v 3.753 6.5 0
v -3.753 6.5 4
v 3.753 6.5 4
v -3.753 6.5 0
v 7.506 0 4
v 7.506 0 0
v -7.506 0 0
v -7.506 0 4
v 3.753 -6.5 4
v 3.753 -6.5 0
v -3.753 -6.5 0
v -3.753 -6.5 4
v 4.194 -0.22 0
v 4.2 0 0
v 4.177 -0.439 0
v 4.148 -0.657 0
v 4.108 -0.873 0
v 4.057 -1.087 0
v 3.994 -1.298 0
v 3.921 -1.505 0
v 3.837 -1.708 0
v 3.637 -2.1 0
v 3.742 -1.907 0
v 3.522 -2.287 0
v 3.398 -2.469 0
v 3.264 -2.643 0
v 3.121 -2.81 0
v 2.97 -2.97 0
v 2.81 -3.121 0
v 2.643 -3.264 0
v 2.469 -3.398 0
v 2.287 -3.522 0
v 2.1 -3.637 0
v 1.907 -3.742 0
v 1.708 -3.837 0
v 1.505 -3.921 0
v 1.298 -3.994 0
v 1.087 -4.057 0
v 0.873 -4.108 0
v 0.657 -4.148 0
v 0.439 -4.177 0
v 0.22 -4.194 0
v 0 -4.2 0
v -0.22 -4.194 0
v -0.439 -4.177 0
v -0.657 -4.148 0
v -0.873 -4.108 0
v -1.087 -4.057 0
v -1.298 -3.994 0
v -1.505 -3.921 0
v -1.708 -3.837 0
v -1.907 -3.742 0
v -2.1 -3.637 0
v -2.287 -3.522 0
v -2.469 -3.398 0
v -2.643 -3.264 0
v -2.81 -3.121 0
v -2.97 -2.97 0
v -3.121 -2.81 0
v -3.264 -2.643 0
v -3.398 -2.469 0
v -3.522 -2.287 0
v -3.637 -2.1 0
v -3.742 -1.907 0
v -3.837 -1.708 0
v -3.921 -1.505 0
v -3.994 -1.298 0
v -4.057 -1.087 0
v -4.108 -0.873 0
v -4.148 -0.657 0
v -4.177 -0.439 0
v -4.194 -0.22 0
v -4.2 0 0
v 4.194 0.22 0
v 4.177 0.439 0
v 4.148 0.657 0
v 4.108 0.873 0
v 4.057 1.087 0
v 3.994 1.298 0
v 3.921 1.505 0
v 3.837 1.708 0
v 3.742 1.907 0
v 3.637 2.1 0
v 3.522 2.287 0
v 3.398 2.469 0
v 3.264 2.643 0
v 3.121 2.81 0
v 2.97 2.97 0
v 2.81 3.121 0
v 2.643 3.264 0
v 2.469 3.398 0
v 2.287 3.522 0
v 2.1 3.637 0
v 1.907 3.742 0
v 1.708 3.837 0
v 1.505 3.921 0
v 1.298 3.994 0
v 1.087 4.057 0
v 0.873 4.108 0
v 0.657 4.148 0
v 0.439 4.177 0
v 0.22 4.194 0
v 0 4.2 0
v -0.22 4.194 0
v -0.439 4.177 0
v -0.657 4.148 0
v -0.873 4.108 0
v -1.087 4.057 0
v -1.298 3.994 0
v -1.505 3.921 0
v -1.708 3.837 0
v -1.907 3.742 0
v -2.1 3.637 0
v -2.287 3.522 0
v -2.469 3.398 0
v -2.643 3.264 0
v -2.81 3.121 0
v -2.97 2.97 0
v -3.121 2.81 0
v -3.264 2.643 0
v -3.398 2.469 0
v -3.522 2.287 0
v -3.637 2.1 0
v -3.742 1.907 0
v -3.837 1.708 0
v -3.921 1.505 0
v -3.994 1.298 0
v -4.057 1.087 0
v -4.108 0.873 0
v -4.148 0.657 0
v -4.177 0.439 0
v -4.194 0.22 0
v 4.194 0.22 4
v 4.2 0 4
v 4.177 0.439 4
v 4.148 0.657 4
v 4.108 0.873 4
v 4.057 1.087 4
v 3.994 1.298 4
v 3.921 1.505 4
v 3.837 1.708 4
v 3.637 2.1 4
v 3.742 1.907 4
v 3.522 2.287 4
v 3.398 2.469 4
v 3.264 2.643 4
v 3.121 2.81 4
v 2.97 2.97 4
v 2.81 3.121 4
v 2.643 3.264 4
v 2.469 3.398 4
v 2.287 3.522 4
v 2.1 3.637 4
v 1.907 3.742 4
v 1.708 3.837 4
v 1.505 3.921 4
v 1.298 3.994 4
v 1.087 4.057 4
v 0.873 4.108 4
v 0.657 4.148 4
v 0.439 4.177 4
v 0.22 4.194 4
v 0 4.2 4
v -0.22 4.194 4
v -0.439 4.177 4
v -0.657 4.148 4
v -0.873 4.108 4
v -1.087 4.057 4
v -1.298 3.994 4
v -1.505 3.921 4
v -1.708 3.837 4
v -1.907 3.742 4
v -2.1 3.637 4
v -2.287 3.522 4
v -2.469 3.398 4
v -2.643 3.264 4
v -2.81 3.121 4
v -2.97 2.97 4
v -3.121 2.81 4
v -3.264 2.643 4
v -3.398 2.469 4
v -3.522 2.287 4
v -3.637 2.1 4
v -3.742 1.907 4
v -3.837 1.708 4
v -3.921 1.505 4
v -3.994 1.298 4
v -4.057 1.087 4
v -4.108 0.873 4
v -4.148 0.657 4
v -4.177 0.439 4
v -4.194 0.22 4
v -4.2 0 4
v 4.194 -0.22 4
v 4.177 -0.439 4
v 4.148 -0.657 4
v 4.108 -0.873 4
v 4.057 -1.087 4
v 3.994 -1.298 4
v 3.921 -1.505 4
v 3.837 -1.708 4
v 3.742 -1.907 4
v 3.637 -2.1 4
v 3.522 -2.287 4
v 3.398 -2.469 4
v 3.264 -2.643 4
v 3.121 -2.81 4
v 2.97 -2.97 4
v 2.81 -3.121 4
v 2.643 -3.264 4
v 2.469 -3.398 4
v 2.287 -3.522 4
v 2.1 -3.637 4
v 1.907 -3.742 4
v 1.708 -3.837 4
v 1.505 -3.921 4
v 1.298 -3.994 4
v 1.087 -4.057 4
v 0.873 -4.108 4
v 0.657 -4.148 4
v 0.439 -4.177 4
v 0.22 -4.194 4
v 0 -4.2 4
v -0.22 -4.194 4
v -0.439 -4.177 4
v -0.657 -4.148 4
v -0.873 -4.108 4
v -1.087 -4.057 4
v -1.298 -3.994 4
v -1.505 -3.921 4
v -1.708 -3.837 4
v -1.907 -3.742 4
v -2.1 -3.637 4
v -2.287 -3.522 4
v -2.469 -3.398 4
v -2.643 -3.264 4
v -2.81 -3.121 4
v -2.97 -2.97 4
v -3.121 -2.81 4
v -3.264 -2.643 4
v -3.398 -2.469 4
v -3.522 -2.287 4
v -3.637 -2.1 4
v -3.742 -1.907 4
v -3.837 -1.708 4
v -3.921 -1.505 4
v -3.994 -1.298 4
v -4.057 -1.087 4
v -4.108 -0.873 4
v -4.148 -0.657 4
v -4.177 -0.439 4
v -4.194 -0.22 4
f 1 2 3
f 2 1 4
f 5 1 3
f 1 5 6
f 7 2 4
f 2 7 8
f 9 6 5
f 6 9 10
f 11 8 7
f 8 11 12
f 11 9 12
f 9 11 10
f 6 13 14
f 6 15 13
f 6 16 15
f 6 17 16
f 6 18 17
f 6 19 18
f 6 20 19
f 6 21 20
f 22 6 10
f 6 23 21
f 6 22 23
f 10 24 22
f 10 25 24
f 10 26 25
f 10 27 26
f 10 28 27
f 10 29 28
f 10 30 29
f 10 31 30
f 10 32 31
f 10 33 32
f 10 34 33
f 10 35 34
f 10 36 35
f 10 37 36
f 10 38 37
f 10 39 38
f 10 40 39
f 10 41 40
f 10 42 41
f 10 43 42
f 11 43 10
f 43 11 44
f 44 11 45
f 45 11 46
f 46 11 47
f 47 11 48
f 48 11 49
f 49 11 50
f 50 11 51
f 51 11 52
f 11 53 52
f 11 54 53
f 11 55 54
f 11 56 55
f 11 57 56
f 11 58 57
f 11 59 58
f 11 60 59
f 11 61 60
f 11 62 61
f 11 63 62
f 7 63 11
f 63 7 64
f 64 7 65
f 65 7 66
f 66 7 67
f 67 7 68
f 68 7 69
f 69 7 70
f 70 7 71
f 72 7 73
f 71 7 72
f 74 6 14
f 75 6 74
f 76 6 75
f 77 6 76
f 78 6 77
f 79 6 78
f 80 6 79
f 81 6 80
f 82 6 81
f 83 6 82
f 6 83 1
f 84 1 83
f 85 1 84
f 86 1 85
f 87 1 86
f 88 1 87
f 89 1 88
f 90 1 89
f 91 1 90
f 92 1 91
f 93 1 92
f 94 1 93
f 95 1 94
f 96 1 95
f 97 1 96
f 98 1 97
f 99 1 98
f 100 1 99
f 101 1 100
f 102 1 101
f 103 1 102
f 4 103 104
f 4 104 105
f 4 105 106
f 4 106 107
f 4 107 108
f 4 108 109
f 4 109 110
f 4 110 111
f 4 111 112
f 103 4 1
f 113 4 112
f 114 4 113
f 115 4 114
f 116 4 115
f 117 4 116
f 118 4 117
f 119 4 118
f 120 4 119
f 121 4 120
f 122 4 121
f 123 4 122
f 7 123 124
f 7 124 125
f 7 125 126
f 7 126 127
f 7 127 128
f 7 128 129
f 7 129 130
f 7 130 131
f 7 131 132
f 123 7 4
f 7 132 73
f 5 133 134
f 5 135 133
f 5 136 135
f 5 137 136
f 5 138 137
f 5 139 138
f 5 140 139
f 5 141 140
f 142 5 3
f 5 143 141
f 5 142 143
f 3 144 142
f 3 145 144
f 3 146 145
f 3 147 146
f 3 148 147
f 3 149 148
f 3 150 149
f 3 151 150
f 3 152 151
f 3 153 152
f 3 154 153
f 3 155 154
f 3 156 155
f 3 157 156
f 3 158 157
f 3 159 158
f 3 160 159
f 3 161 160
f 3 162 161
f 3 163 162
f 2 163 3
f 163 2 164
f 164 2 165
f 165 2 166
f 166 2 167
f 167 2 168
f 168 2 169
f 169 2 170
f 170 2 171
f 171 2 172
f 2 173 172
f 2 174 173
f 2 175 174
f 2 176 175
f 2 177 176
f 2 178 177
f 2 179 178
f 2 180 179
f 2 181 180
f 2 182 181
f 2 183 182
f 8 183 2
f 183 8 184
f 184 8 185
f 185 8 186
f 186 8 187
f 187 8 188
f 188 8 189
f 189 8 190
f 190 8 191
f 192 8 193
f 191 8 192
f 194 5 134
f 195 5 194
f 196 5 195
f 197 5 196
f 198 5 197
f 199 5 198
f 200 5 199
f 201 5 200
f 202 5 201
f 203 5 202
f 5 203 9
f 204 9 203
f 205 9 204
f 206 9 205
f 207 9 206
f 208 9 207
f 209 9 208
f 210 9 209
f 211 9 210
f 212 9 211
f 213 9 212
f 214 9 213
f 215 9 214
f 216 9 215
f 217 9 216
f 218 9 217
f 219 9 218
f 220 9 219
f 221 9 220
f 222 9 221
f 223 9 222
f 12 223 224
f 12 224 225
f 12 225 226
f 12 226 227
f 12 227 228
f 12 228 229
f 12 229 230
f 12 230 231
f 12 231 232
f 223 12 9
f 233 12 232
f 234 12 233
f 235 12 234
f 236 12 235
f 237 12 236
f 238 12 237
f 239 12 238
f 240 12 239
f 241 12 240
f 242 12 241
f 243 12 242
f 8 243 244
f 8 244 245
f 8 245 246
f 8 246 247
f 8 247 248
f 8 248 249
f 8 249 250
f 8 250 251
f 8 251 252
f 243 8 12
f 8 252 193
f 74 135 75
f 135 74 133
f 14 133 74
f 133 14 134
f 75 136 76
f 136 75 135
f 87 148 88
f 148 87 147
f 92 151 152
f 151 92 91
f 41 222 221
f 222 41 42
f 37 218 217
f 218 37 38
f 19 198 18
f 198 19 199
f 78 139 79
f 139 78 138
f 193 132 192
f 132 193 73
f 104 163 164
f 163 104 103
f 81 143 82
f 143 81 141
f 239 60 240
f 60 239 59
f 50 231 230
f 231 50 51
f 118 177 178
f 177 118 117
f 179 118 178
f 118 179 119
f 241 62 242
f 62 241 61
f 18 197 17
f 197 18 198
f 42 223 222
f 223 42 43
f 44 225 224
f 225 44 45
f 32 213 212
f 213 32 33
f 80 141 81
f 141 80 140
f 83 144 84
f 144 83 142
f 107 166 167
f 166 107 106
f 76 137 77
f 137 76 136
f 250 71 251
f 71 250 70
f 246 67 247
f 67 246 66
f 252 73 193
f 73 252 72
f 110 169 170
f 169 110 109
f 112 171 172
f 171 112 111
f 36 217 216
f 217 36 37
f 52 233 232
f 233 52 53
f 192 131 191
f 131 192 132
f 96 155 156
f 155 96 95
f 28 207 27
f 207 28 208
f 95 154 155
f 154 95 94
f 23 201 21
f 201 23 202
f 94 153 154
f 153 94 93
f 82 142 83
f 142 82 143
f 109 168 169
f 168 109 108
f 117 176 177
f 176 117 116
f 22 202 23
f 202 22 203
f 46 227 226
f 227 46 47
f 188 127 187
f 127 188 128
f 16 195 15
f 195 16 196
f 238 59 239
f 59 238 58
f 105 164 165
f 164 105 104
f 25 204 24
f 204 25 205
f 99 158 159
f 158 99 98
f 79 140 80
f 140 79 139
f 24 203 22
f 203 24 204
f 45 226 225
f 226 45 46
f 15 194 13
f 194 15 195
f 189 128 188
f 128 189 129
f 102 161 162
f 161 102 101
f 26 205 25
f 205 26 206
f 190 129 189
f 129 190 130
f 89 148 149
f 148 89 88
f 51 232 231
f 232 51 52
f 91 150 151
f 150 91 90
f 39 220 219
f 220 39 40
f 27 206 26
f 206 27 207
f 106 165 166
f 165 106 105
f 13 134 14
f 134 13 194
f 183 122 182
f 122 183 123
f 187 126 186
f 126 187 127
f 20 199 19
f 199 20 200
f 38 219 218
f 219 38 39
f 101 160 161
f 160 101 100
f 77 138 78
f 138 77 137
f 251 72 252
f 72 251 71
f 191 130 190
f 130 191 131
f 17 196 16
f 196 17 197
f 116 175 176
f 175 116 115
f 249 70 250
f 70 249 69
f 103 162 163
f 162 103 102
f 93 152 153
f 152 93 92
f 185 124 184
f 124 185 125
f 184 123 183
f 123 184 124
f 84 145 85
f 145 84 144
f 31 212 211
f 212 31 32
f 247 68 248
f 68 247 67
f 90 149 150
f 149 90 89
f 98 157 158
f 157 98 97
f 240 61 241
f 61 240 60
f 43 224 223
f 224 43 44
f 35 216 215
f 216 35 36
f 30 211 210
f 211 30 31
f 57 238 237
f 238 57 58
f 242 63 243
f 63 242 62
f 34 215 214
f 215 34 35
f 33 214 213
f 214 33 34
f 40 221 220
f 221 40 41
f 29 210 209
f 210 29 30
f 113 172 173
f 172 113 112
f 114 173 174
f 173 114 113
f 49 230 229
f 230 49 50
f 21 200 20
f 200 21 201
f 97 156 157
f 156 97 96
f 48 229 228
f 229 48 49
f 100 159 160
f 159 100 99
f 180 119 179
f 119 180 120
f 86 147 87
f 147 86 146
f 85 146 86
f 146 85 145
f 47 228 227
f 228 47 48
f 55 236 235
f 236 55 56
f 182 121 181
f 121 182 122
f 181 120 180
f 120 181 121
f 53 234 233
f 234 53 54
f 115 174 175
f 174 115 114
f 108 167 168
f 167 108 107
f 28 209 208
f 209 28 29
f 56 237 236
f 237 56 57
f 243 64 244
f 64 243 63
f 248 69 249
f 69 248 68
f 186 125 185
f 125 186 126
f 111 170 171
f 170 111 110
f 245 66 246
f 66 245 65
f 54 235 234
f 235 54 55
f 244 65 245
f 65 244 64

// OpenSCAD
$fn = 120;

screw_d = 8.0;          // nominal screw diameter (mm)
clearance = 0.4;        // typical clearance for M8 (adjust for your printer)
hole_d = screw_d + clearance;

across_flats = 13.0;    // mm
thickness = 4.0;        // mm

module hex_prism_af(af, h) {
    // For a regular hexagon: across_flats = sqrt(3) * circumradius
    r = af / sqrt(3);
    linear_extrude(height = h)
        polygon(points = [for (i = [0:5]) [r*cos(60*i), r*sin(60*i)]]);
}

difference() {
    hex_prism_af(across_flats, thickness);
    translate([0,0,-0.2])
        cylinder(d = hole_d, h = thickness + 0.4);
}
